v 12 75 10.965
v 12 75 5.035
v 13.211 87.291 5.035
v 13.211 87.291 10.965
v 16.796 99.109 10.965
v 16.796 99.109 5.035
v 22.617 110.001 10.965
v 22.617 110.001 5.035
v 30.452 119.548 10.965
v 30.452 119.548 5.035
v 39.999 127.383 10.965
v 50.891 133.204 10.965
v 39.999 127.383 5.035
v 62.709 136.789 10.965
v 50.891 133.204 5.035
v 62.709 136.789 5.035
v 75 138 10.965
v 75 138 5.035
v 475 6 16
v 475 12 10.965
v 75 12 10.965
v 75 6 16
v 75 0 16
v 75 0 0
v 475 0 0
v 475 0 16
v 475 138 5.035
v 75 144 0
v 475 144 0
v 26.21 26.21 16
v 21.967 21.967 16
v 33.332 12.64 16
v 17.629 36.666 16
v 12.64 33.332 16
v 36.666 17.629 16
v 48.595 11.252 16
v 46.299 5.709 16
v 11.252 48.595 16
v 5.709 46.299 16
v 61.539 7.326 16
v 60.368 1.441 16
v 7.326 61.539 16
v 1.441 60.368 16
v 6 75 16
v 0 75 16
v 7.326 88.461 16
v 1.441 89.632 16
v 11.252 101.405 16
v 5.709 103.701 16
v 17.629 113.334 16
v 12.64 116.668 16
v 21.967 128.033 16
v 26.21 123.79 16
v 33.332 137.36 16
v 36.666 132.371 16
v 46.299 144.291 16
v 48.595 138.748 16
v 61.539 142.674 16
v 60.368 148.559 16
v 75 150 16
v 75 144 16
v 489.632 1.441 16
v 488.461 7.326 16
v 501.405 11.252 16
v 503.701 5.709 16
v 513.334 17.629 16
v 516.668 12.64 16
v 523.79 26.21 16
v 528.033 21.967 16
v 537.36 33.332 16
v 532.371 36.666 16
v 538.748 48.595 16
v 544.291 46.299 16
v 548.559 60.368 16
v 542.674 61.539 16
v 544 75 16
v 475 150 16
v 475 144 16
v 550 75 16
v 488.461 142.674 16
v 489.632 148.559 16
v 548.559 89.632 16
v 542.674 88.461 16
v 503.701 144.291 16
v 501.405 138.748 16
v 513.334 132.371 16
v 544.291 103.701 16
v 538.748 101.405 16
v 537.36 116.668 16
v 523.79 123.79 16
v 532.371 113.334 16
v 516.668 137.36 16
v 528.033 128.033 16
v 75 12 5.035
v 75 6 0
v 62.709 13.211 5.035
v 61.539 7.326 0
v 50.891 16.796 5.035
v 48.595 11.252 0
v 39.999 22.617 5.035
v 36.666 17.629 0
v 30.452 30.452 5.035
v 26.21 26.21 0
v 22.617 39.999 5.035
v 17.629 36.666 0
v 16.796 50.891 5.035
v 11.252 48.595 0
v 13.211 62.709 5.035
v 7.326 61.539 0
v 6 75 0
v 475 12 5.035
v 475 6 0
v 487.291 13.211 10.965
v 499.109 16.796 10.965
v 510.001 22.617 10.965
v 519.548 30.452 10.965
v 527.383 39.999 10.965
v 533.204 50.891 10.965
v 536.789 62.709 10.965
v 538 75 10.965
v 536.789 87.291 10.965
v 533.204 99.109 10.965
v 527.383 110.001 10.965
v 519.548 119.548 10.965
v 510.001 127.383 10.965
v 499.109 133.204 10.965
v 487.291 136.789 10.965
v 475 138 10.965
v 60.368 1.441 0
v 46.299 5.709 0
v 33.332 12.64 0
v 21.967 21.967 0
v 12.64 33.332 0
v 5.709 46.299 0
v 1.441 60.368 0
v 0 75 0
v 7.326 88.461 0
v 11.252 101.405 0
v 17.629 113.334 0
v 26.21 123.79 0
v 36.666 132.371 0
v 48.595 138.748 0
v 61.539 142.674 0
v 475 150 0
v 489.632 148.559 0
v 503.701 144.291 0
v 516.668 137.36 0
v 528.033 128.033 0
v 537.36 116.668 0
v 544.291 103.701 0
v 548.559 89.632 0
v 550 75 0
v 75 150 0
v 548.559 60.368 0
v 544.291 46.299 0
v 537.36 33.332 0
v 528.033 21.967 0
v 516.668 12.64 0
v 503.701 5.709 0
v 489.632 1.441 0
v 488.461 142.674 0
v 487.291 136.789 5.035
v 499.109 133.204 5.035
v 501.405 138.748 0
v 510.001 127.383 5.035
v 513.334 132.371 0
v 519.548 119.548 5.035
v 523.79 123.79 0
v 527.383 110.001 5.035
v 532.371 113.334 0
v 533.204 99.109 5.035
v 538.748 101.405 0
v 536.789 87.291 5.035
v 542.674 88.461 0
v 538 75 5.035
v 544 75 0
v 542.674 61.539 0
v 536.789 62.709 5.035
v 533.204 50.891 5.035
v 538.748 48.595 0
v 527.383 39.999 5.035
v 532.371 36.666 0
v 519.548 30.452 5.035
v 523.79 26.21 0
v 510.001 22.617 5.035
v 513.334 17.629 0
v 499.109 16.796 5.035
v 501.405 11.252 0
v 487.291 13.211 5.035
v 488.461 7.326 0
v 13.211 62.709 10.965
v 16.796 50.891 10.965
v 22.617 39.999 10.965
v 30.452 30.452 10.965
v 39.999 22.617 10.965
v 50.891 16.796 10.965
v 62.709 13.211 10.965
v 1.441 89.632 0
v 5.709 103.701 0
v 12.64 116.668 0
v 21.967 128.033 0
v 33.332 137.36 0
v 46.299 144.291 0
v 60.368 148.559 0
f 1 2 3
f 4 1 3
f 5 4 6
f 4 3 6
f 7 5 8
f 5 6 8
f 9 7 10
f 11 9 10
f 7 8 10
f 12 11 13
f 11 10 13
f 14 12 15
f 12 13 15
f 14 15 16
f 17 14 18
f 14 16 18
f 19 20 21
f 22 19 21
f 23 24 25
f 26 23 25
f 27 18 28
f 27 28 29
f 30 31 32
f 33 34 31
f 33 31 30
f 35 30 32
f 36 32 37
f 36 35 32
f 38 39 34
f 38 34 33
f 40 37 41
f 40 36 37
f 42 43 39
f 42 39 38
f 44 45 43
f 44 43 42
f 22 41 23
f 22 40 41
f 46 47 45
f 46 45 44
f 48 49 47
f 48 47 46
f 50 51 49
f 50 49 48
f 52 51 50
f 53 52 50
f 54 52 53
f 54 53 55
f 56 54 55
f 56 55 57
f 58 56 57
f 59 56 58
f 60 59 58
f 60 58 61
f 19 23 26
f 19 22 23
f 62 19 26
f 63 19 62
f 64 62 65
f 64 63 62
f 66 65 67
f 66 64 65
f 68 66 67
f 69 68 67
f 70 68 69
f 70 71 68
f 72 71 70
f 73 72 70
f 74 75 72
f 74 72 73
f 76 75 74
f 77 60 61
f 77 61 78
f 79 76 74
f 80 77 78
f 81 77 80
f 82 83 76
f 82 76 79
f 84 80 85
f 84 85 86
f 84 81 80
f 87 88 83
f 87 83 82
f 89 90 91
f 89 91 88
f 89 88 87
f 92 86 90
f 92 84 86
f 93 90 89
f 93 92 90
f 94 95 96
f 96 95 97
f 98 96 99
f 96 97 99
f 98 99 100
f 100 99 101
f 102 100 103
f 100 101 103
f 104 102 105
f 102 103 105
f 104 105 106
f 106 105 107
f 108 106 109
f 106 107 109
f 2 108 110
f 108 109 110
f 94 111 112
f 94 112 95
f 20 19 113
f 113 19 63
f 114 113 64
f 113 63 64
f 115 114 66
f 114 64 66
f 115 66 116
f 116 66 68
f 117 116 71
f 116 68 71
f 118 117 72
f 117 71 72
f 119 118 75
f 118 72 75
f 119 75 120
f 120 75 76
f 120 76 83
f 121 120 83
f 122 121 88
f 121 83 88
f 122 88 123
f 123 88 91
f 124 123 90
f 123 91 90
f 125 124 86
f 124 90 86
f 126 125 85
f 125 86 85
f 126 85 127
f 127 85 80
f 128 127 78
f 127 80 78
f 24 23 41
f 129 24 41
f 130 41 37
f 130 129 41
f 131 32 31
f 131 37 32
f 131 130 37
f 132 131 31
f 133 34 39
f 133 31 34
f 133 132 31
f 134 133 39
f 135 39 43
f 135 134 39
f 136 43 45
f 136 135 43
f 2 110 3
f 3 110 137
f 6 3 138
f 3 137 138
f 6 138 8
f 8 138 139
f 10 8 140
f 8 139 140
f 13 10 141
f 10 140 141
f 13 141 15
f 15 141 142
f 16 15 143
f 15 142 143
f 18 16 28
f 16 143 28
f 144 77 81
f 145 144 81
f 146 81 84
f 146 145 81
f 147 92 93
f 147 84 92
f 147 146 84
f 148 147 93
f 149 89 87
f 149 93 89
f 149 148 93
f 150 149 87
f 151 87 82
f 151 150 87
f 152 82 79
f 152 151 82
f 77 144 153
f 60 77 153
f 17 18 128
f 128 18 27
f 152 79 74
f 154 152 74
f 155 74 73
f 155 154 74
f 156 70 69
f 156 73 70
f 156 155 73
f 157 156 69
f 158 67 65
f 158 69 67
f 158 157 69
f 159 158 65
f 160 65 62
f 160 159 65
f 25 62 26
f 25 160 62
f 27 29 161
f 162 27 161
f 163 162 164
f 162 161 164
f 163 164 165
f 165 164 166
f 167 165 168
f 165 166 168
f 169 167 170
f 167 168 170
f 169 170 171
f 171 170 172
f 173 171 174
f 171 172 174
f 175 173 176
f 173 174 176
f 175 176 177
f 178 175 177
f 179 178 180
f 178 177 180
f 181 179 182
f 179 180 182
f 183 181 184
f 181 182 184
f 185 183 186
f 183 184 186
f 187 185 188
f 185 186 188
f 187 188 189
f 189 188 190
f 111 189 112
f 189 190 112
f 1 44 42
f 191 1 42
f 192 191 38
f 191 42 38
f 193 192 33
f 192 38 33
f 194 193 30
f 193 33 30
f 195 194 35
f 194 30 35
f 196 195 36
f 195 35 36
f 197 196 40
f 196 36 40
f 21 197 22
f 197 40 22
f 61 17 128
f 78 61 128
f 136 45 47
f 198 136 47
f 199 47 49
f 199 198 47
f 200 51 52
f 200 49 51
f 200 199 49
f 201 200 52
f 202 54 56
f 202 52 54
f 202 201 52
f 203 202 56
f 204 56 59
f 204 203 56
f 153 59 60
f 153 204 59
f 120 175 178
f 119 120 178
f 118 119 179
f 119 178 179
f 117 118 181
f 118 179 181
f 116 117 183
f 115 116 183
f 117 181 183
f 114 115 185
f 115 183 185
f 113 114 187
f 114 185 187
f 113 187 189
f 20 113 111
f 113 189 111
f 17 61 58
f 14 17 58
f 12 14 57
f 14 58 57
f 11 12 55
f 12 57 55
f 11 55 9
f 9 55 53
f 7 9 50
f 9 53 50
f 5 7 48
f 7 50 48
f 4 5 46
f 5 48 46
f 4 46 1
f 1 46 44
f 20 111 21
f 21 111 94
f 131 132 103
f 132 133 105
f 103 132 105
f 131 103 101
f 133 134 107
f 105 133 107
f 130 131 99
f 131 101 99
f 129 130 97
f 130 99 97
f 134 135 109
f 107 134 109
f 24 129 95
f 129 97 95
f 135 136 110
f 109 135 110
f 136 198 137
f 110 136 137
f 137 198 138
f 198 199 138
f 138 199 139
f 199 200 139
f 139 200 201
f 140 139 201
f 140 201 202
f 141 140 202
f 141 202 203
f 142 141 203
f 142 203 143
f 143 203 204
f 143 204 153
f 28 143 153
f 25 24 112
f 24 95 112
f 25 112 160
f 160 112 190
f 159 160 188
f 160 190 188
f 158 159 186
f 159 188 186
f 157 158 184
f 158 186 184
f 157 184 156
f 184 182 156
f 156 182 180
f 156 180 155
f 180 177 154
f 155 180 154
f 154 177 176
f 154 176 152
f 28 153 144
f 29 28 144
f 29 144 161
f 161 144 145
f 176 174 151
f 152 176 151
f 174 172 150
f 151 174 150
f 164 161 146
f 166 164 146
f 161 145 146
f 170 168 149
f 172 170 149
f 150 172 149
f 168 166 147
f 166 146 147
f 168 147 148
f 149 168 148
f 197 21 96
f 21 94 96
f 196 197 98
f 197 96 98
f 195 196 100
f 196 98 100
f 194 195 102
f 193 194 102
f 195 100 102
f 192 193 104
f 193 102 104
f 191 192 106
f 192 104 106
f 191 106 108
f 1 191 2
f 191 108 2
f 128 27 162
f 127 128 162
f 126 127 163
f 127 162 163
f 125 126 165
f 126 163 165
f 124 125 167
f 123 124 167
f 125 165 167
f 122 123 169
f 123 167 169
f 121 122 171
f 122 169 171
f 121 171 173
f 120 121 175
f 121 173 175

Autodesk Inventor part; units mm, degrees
ref_plane "YZ Plane" through (0, 0, 0) normal (1, 0, 0) x (0, 1, 0)
ref_plane "XZ Plane" through (0, 0, 0) normal (0, 1, 0) x (-1, 0, 0)
ref_plane "XY Plane" through (0, 0, 0) normal (0, 0, 1) x (1, 0, 0)
sketch "Sketch1" plane through (0, 0, 0) normal (0, 0, 1) x (1, 0, 0)
  line L0 (75, 0) -> (475, 0)
  line L1 (550, 75) -> (550, 75)
  line L2 (475, 150) -> (75, 150)
  line L3 (0, 75) -> (0, 75)
  arc A0 (75, 150) -> (0, 75) centre (75, 75) ccw
  arc A1 (0, 75) -> (75, 0) centre (75, 75) ccw
  arc A2 (475, 0) -> (550, 75) centre (475, 75) ccw
  arc A3 (550, 75) -> (475, 150) centre (475, 75) ccw
  line L4 (75, 138) -> (475, 138)
  line L5 (538, 75) -> (538, 75)
  line L6 (475, 12) -> (75, 12)
  line L7 (12, 75) -> (12, 75)
  arc A4 (75, 138) -> (12, 75) centre (75, 75) ccw
  arc A5 (12, 75) -> (75, 12) centre (75, 75) ccw
  arc A6 (475, 12) -> (538, 75) centre (475, 75) ccw
  arc A7 (538, 75) -> (475, 138) centre (475, 75) ccw
  point P0 (0, 0)
  point P1 (550, 150)
  point P2 (550, 0)
  point P3 (0, 150)
  point P4 (531, 5)
  point P5 (531, 131)
  point P6 (5, 5)
  point P7 (538, 12)
  point P8 (538, 138)
  point P9 (12, 12)
  dimension "d0" = 550
  dimension "d1" = 150
  dimension "d2" = 75
  dimension "d3" = 526
  dimension "d4" = 126
  dimension "d6" = 526
  dimension "d7" = 126
  dimension "d8" = 63
extrude "Extrusion1" add sketch "Sketch1" along normal blind 16
chamfer "Chamfer1" distance 6 angle 40 4 edges at (275, 12, 16) (30.4523, 30.4523, 16) (275, 138, 16) (519.5477, 119.5477, 16) measured on face at (341.6667, 8, 16)
chamfer "Chamfer2" distance 6 angle 40 4 edges at (275, 138, 0) (30.4523, 30.4523, 0) (275, 12, 0) (519.5477, 119.5477, 0) measured on face at (341.6667, 8, 0)
properties part number "big belt" material "Rubber"
